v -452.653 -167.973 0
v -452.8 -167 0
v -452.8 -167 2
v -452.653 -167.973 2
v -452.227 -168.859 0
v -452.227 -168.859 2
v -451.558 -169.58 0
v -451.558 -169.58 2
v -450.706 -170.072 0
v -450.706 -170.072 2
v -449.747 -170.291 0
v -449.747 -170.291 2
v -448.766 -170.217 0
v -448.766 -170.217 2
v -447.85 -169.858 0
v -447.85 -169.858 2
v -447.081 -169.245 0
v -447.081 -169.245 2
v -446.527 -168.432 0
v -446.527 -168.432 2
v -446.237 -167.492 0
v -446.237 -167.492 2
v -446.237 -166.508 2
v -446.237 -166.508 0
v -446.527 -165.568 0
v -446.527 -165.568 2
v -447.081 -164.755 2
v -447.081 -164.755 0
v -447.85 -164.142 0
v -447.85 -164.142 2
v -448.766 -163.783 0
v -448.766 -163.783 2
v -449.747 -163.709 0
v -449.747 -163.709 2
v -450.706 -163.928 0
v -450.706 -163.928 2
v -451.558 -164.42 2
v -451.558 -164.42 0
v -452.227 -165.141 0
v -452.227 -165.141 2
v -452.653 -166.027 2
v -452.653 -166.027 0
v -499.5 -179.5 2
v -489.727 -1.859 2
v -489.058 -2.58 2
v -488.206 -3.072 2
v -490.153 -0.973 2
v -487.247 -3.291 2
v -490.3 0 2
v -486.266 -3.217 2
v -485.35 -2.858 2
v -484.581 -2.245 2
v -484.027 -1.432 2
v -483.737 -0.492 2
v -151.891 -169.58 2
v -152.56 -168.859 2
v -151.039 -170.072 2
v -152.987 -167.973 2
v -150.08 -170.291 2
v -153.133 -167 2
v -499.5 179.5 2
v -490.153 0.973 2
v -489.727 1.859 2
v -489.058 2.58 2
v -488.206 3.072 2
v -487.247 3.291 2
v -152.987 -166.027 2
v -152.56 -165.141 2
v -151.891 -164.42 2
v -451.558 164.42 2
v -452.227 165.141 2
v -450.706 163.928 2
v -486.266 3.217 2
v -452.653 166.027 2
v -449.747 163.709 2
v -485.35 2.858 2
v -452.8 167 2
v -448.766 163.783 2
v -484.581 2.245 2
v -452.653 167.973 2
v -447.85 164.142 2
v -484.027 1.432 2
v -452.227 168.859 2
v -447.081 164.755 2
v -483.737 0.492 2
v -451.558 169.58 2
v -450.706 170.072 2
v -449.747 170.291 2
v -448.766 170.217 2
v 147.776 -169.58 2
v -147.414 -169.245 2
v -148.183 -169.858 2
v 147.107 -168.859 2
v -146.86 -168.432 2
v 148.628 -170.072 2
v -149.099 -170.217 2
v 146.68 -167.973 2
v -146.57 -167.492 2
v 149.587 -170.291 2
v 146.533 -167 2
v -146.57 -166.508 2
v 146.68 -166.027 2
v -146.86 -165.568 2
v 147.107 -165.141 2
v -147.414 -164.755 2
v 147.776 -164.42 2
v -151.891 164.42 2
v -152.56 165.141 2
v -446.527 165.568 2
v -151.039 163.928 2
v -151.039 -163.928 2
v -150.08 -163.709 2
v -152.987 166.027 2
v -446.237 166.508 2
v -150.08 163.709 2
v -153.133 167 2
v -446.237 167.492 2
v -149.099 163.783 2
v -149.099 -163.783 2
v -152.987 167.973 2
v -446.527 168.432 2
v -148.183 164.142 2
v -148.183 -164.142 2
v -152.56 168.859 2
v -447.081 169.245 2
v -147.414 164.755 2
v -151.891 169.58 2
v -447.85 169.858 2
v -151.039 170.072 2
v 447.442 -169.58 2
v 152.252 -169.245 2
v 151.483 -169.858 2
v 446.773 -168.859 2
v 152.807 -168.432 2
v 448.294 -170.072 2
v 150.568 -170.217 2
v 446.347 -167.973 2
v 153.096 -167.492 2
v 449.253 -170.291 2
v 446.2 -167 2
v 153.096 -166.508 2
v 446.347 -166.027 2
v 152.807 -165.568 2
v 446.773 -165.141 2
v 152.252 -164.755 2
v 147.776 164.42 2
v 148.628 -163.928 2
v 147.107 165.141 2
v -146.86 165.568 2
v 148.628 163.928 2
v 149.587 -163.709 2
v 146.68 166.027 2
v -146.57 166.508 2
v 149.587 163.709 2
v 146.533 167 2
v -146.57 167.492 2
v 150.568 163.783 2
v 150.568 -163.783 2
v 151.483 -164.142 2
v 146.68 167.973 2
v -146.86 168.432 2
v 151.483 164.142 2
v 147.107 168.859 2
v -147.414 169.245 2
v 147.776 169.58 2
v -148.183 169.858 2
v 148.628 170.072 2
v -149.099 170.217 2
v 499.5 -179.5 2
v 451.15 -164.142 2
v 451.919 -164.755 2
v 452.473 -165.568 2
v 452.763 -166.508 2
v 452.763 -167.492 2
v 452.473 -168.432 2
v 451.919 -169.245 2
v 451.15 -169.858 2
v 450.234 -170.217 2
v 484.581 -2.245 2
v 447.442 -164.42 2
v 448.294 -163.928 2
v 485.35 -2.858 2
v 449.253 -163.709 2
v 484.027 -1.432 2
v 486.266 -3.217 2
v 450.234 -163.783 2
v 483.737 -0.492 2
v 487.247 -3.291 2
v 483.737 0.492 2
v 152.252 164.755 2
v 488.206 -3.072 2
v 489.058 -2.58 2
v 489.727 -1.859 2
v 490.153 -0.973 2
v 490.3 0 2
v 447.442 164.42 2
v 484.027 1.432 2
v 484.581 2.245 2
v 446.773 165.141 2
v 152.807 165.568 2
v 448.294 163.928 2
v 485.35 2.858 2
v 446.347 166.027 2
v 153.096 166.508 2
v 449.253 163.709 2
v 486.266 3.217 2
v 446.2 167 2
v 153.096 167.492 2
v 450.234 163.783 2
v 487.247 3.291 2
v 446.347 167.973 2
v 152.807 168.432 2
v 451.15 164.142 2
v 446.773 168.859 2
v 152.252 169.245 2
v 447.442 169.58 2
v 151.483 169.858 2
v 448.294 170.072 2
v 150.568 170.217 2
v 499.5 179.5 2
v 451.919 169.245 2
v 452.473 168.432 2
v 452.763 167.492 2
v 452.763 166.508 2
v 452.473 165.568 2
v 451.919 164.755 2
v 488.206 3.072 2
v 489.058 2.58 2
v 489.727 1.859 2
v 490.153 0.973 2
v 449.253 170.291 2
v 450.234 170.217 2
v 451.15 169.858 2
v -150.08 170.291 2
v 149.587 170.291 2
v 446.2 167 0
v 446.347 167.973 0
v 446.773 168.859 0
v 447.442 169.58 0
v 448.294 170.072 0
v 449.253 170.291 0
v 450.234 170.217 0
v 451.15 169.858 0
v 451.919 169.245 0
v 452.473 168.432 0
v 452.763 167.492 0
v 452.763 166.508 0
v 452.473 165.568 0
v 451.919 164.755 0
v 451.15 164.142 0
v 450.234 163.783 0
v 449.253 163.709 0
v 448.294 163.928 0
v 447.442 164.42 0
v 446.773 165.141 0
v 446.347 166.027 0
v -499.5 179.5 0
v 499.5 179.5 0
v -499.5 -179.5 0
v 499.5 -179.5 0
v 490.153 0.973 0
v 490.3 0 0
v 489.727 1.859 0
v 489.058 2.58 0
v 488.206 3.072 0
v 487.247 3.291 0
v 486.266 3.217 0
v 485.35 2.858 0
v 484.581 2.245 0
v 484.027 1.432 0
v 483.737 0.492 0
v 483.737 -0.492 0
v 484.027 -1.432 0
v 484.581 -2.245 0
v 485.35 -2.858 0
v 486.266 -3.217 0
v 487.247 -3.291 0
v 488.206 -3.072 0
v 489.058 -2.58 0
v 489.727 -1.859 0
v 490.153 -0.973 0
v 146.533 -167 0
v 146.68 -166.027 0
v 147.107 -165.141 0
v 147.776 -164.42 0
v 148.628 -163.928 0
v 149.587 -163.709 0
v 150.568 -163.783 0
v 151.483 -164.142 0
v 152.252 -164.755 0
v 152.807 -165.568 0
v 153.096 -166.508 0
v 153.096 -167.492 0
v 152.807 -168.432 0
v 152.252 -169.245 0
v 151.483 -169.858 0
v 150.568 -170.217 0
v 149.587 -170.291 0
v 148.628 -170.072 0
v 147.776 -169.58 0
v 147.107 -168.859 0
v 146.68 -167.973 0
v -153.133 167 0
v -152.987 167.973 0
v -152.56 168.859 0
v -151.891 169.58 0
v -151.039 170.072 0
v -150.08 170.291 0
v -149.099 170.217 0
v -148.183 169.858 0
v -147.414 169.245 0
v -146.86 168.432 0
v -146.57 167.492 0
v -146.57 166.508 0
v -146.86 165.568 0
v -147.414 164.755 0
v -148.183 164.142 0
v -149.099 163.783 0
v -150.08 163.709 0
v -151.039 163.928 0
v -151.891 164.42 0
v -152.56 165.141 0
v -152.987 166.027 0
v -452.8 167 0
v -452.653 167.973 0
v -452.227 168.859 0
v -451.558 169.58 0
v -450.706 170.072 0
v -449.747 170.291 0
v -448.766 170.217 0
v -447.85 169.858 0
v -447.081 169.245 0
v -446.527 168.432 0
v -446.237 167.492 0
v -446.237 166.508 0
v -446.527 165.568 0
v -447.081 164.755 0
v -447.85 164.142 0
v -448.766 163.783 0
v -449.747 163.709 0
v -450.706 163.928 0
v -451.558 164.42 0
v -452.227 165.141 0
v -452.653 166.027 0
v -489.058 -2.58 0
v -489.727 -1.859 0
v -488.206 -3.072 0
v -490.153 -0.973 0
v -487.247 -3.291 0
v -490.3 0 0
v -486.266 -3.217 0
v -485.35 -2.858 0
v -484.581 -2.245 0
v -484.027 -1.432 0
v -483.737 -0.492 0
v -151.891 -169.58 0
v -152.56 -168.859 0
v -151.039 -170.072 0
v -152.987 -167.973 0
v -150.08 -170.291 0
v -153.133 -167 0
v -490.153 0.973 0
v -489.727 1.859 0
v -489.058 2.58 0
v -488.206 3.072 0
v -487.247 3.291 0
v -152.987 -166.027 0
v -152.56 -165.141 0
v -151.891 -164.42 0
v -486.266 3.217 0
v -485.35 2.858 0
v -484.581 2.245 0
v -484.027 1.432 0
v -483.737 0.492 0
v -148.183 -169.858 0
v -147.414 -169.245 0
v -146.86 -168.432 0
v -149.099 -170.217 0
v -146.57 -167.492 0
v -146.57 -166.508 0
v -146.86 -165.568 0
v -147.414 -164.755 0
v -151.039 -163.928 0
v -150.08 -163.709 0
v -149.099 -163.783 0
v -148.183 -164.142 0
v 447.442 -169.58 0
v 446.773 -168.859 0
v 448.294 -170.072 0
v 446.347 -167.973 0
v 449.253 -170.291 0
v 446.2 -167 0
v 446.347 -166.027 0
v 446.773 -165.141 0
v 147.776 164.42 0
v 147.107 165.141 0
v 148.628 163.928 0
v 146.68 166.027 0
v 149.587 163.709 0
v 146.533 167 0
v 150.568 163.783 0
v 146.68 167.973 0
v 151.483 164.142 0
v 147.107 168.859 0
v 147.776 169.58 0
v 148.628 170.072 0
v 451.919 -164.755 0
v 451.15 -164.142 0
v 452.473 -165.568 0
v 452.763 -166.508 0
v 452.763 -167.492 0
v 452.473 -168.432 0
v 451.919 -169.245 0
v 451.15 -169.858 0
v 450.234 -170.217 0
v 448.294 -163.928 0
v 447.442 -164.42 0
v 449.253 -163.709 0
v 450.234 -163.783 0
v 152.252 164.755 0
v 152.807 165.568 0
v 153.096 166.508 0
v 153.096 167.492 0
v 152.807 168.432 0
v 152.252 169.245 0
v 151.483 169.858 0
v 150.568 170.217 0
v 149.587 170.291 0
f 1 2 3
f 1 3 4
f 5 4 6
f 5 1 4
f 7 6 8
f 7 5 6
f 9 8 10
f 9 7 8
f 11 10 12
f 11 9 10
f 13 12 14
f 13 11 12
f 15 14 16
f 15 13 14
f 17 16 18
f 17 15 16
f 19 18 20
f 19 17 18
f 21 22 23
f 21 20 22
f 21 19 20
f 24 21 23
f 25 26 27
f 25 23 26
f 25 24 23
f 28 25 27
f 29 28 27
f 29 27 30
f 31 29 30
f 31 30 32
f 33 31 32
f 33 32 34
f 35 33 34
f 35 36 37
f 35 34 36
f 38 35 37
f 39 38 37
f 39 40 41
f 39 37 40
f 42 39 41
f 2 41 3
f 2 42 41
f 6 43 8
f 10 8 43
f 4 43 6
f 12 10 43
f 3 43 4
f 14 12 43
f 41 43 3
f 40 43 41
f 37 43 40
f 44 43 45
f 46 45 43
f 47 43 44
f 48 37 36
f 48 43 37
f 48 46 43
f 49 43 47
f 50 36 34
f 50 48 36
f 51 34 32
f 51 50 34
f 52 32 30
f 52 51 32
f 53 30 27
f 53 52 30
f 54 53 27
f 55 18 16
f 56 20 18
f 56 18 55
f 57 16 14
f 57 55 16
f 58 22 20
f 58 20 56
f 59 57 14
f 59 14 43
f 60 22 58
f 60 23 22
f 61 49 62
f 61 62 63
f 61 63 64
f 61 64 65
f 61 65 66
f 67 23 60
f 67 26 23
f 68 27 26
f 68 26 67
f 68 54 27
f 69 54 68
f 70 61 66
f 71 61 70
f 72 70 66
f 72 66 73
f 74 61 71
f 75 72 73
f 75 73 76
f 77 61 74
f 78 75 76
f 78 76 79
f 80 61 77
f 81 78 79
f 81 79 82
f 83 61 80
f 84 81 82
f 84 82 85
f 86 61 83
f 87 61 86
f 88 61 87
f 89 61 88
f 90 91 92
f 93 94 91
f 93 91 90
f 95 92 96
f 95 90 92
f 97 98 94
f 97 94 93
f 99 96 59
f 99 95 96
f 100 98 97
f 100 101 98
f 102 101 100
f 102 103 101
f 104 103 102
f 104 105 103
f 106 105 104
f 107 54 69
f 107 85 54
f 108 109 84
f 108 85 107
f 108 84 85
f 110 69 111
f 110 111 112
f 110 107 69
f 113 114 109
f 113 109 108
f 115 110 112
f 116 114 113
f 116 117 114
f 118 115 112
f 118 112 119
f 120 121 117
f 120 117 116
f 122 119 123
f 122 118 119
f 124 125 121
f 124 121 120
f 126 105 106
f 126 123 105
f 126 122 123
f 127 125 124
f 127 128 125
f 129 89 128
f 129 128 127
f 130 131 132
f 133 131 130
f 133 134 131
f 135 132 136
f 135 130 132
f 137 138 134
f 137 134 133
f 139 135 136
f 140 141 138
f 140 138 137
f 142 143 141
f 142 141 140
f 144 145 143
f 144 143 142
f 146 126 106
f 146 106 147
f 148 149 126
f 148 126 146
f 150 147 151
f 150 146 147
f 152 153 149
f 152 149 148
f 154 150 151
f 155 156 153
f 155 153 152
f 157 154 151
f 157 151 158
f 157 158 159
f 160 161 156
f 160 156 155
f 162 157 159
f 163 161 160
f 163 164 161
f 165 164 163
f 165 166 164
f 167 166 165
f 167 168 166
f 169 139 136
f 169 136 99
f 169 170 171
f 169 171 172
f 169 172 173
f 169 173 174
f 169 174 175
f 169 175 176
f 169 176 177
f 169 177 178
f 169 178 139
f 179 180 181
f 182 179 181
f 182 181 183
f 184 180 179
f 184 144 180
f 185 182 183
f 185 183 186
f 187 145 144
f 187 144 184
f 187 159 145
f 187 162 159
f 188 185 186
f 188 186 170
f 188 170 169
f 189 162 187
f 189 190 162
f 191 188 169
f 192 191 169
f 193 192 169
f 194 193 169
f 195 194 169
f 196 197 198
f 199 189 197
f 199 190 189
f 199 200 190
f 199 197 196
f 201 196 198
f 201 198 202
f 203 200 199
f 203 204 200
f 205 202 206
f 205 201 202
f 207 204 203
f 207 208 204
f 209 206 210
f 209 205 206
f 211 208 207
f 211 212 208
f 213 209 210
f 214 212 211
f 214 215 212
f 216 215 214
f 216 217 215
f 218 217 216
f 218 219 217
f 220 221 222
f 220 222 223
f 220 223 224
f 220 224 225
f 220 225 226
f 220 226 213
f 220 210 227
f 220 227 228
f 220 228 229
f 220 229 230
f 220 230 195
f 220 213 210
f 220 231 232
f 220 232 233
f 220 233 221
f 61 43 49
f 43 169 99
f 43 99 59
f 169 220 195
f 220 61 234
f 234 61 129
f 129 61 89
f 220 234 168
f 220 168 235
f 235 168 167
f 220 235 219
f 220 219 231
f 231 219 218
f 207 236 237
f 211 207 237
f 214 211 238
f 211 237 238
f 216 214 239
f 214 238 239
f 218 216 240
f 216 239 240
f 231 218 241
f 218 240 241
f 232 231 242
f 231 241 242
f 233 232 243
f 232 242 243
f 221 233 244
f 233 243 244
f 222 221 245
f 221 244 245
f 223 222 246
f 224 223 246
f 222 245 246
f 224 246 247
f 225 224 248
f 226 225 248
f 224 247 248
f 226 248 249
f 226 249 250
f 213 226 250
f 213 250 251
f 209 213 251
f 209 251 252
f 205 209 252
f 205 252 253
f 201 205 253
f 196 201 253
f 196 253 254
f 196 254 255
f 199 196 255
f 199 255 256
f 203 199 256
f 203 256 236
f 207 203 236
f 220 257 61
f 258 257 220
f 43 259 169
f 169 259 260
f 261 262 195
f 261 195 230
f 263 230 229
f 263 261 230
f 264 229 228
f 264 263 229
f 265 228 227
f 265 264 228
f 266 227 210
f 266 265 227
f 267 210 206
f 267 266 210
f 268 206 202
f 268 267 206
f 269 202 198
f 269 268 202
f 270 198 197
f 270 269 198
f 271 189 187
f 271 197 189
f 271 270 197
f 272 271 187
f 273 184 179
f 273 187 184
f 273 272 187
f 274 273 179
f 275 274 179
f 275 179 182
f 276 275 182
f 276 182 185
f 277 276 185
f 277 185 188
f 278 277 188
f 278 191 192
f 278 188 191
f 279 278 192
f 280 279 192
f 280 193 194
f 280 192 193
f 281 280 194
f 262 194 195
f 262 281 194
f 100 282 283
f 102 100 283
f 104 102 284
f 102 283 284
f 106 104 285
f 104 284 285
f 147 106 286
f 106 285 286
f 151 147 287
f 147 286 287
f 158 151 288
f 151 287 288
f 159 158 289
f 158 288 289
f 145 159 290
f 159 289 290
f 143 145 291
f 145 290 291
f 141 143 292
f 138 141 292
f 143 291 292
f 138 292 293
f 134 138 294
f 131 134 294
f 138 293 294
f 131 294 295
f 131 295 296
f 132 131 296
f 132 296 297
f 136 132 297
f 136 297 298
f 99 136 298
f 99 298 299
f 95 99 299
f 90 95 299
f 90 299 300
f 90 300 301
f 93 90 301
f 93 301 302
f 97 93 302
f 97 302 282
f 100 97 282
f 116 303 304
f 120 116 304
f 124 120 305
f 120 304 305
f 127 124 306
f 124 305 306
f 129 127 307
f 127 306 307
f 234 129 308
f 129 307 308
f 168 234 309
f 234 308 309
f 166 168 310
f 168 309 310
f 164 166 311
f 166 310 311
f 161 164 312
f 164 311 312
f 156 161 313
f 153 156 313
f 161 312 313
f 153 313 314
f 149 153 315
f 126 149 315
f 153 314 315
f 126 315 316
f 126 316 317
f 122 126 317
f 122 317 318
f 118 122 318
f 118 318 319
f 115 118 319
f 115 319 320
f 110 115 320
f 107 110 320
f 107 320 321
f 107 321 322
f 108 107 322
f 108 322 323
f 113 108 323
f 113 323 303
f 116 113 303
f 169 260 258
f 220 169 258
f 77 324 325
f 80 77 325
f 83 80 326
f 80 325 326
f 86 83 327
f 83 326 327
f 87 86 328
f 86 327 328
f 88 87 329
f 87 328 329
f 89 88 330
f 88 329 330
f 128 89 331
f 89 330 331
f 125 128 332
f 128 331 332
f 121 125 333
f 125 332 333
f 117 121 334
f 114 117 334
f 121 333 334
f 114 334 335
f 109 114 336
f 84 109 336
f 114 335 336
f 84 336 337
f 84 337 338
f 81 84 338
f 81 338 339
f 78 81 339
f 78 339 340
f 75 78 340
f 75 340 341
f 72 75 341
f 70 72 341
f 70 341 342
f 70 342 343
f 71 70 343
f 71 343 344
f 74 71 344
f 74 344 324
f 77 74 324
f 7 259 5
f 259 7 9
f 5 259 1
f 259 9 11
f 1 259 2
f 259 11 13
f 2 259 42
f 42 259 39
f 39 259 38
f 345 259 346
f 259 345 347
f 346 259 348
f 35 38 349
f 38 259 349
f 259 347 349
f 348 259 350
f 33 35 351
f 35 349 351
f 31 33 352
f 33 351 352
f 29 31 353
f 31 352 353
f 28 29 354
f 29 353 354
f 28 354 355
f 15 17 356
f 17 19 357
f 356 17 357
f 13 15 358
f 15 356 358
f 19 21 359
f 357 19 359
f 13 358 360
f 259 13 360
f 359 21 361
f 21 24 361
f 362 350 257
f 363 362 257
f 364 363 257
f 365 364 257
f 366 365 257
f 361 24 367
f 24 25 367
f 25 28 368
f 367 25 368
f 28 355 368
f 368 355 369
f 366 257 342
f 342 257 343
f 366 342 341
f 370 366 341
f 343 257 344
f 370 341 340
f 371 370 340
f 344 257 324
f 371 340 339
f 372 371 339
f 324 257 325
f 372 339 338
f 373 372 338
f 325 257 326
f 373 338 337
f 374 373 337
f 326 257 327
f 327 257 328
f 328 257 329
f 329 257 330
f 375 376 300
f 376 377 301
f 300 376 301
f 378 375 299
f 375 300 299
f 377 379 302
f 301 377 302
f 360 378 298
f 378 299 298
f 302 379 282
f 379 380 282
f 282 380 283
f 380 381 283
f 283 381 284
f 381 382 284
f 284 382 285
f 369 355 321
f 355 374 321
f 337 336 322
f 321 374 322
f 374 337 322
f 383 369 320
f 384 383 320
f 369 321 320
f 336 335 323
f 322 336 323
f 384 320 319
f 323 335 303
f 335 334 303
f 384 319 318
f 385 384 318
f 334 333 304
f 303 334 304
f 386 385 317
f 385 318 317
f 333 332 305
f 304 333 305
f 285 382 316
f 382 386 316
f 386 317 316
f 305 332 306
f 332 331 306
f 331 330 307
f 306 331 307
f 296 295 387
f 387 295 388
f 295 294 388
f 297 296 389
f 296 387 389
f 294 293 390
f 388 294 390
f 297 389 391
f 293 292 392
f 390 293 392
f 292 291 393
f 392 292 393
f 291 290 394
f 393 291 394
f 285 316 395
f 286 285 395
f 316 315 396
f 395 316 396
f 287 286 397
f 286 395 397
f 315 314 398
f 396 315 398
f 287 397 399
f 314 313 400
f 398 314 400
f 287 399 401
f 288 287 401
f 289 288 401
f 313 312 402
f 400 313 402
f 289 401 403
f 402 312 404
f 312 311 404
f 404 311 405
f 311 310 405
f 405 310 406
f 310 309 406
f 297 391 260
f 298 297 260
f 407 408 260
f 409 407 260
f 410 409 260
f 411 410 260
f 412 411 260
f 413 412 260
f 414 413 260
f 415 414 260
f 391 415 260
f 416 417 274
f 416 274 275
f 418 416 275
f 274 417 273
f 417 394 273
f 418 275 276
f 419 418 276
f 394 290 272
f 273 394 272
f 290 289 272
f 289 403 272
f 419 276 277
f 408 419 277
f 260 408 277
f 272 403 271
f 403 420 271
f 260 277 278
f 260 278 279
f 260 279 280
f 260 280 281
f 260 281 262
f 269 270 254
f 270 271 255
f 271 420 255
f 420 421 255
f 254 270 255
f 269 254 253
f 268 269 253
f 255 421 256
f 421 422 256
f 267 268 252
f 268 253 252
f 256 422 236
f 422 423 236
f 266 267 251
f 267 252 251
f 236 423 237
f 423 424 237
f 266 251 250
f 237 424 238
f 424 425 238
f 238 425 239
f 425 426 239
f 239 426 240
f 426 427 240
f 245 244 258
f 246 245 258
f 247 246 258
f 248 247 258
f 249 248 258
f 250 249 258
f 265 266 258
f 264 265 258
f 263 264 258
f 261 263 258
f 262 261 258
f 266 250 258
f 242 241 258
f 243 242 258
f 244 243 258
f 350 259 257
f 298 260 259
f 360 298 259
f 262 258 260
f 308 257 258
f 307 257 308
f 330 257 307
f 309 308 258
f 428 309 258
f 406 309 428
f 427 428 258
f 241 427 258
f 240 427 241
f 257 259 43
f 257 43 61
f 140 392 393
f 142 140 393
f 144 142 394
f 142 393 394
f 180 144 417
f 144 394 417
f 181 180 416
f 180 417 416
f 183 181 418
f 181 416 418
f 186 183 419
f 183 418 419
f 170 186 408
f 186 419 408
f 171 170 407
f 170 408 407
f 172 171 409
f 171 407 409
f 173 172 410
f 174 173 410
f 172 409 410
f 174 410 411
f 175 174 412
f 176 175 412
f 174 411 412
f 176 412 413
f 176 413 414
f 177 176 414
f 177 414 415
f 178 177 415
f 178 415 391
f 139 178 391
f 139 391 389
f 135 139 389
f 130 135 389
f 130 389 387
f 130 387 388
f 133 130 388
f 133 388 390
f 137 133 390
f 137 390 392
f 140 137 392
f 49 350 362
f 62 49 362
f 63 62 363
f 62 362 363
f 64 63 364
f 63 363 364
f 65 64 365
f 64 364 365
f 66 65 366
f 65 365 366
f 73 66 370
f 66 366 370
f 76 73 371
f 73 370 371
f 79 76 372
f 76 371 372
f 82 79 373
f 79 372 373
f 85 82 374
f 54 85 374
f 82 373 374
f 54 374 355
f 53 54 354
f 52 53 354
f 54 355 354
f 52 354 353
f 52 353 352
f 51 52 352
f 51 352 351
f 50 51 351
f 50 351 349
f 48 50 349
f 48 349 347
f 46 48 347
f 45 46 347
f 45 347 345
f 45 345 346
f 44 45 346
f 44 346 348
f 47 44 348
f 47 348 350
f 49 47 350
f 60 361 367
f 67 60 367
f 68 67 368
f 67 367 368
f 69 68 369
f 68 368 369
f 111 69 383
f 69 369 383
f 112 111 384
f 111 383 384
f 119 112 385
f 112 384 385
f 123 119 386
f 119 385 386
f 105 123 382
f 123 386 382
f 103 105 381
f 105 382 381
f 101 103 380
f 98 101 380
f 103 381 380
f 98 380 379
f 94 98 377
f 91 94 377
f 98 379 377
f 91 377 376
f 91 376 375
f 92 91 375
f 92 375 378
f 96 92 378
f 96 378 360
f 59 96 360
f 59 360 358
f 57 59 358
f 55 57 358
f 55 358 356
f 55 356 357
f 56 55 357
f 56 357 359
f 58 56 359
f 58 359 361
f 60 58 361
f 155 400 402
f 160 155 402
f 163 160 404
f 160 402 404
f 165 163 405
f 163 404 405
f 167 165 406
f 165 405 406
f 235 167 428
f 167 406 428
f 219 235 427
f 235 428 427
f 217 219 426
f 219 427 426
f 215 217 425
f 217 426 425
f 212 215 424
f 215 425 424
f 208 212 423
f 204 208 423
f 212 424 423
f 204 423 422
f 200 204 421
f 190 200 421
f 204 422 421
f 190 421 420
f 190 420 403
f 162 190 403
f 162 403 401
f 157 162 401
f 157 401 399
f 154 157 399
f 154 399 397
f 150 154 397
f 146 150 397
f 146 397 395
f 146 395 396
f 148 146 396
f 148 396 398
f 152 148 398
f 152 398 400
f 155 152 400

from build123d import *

# Parameters (mm, degrees)
SKETCH1_W            = 999
SKETCH1_H            = 359
BOSS_EXTRUDE1_DEPTH  = 2
M6_CLEARANCE_HOLE1_D = 6.6
LPATTERN1_COUNT      = 4
LPATTERN1_PITCH      = 299.666666667
MIRROR1_COPY_1_D     = 6.6
MIRROR1_COPY_2_D     = 6.6
MIRROR1_COPY_3_D     = 6.6
M6_CLEARANCE_HOLE2_D = 6.6


with BuildPart() as part:
    # Sketch1 → Boss-Extrude1 (new body)
    with BuildSketch(Plane.XY):
        Rectangle(SKETCH1_W, SKETCH1_H)
    extrude(amount=BOSS_EXTRUDE1_DEPTH)

    # M6 Clearance Hole1 (through all)
    with Locations(Plane.XY.offset(2)):
        with Locations((-449.5, 167)):
            m6_clearance_hole1 = Hole(M6_CLEARANCE_HOLE1_D / 2)

    # LPattern1: M6 Clearance Hole1 ×4
    with Locations(*[(i * LPATTERN1_PITCH, 0, 0) for i in range(1, LPATTERN1_COUNT)]):
        add(m6_clearance_hole1, mode=Mode.SUBTRACT)

    # Mirror1: M6 Clearance Hole1 across plane
    add(m6_clearance_hole1.mirror(Plane.ZX), mode=Mode.SUBTRACT)

    # Mirror1 copy 1 (through all)
    with Locations(Plane(origin=(299.666666667, 0, 2), x_dir=(1, 0, 0), z_dir=(0, 0, 1))):
        with Locations((-449.5, -167)):
            Hole(MIRROR1_COPY_1_D / 2)

    # Mirror1 copy 2 (through all)
    with Locations(Plane(origin=(599.333333333, 0, 2), x_dir=(1, 0, 0), z_dir=(0, 0, 1))):
        with Locations((-449.5, -167)):
            Hole(MIRROR1_COPY_2_D / 2)

    # Mirror1 copy 3 (through all)
    with Locations(Plane(origin=(899, 0, 2), x_dir=(1, 0, 0), z_dir=(0, 0, 1))):
        with Locations((-449.5, -167)):
            Hole(MIRROR1_COPY_3_D / 2)

    # M6 Clearance Hole2 (through all)
    with Locations(Plane.XY.offset(2)):
        with Locations((-487, 0)):
            m6_clearance_hole2 = Hole(M6_CLEARANCE_HOLE2_D / 2)

    # Mirror2: M6 Clearance Hole2 across plane
    add(m6_clearance_hole2.mirror(Plane(origin=(0, 0, 0), x_dir=(0, 0, 1), z_dir=(1, 0, 0))), mode=Mode.SUBTRACT)


solid = part.part
